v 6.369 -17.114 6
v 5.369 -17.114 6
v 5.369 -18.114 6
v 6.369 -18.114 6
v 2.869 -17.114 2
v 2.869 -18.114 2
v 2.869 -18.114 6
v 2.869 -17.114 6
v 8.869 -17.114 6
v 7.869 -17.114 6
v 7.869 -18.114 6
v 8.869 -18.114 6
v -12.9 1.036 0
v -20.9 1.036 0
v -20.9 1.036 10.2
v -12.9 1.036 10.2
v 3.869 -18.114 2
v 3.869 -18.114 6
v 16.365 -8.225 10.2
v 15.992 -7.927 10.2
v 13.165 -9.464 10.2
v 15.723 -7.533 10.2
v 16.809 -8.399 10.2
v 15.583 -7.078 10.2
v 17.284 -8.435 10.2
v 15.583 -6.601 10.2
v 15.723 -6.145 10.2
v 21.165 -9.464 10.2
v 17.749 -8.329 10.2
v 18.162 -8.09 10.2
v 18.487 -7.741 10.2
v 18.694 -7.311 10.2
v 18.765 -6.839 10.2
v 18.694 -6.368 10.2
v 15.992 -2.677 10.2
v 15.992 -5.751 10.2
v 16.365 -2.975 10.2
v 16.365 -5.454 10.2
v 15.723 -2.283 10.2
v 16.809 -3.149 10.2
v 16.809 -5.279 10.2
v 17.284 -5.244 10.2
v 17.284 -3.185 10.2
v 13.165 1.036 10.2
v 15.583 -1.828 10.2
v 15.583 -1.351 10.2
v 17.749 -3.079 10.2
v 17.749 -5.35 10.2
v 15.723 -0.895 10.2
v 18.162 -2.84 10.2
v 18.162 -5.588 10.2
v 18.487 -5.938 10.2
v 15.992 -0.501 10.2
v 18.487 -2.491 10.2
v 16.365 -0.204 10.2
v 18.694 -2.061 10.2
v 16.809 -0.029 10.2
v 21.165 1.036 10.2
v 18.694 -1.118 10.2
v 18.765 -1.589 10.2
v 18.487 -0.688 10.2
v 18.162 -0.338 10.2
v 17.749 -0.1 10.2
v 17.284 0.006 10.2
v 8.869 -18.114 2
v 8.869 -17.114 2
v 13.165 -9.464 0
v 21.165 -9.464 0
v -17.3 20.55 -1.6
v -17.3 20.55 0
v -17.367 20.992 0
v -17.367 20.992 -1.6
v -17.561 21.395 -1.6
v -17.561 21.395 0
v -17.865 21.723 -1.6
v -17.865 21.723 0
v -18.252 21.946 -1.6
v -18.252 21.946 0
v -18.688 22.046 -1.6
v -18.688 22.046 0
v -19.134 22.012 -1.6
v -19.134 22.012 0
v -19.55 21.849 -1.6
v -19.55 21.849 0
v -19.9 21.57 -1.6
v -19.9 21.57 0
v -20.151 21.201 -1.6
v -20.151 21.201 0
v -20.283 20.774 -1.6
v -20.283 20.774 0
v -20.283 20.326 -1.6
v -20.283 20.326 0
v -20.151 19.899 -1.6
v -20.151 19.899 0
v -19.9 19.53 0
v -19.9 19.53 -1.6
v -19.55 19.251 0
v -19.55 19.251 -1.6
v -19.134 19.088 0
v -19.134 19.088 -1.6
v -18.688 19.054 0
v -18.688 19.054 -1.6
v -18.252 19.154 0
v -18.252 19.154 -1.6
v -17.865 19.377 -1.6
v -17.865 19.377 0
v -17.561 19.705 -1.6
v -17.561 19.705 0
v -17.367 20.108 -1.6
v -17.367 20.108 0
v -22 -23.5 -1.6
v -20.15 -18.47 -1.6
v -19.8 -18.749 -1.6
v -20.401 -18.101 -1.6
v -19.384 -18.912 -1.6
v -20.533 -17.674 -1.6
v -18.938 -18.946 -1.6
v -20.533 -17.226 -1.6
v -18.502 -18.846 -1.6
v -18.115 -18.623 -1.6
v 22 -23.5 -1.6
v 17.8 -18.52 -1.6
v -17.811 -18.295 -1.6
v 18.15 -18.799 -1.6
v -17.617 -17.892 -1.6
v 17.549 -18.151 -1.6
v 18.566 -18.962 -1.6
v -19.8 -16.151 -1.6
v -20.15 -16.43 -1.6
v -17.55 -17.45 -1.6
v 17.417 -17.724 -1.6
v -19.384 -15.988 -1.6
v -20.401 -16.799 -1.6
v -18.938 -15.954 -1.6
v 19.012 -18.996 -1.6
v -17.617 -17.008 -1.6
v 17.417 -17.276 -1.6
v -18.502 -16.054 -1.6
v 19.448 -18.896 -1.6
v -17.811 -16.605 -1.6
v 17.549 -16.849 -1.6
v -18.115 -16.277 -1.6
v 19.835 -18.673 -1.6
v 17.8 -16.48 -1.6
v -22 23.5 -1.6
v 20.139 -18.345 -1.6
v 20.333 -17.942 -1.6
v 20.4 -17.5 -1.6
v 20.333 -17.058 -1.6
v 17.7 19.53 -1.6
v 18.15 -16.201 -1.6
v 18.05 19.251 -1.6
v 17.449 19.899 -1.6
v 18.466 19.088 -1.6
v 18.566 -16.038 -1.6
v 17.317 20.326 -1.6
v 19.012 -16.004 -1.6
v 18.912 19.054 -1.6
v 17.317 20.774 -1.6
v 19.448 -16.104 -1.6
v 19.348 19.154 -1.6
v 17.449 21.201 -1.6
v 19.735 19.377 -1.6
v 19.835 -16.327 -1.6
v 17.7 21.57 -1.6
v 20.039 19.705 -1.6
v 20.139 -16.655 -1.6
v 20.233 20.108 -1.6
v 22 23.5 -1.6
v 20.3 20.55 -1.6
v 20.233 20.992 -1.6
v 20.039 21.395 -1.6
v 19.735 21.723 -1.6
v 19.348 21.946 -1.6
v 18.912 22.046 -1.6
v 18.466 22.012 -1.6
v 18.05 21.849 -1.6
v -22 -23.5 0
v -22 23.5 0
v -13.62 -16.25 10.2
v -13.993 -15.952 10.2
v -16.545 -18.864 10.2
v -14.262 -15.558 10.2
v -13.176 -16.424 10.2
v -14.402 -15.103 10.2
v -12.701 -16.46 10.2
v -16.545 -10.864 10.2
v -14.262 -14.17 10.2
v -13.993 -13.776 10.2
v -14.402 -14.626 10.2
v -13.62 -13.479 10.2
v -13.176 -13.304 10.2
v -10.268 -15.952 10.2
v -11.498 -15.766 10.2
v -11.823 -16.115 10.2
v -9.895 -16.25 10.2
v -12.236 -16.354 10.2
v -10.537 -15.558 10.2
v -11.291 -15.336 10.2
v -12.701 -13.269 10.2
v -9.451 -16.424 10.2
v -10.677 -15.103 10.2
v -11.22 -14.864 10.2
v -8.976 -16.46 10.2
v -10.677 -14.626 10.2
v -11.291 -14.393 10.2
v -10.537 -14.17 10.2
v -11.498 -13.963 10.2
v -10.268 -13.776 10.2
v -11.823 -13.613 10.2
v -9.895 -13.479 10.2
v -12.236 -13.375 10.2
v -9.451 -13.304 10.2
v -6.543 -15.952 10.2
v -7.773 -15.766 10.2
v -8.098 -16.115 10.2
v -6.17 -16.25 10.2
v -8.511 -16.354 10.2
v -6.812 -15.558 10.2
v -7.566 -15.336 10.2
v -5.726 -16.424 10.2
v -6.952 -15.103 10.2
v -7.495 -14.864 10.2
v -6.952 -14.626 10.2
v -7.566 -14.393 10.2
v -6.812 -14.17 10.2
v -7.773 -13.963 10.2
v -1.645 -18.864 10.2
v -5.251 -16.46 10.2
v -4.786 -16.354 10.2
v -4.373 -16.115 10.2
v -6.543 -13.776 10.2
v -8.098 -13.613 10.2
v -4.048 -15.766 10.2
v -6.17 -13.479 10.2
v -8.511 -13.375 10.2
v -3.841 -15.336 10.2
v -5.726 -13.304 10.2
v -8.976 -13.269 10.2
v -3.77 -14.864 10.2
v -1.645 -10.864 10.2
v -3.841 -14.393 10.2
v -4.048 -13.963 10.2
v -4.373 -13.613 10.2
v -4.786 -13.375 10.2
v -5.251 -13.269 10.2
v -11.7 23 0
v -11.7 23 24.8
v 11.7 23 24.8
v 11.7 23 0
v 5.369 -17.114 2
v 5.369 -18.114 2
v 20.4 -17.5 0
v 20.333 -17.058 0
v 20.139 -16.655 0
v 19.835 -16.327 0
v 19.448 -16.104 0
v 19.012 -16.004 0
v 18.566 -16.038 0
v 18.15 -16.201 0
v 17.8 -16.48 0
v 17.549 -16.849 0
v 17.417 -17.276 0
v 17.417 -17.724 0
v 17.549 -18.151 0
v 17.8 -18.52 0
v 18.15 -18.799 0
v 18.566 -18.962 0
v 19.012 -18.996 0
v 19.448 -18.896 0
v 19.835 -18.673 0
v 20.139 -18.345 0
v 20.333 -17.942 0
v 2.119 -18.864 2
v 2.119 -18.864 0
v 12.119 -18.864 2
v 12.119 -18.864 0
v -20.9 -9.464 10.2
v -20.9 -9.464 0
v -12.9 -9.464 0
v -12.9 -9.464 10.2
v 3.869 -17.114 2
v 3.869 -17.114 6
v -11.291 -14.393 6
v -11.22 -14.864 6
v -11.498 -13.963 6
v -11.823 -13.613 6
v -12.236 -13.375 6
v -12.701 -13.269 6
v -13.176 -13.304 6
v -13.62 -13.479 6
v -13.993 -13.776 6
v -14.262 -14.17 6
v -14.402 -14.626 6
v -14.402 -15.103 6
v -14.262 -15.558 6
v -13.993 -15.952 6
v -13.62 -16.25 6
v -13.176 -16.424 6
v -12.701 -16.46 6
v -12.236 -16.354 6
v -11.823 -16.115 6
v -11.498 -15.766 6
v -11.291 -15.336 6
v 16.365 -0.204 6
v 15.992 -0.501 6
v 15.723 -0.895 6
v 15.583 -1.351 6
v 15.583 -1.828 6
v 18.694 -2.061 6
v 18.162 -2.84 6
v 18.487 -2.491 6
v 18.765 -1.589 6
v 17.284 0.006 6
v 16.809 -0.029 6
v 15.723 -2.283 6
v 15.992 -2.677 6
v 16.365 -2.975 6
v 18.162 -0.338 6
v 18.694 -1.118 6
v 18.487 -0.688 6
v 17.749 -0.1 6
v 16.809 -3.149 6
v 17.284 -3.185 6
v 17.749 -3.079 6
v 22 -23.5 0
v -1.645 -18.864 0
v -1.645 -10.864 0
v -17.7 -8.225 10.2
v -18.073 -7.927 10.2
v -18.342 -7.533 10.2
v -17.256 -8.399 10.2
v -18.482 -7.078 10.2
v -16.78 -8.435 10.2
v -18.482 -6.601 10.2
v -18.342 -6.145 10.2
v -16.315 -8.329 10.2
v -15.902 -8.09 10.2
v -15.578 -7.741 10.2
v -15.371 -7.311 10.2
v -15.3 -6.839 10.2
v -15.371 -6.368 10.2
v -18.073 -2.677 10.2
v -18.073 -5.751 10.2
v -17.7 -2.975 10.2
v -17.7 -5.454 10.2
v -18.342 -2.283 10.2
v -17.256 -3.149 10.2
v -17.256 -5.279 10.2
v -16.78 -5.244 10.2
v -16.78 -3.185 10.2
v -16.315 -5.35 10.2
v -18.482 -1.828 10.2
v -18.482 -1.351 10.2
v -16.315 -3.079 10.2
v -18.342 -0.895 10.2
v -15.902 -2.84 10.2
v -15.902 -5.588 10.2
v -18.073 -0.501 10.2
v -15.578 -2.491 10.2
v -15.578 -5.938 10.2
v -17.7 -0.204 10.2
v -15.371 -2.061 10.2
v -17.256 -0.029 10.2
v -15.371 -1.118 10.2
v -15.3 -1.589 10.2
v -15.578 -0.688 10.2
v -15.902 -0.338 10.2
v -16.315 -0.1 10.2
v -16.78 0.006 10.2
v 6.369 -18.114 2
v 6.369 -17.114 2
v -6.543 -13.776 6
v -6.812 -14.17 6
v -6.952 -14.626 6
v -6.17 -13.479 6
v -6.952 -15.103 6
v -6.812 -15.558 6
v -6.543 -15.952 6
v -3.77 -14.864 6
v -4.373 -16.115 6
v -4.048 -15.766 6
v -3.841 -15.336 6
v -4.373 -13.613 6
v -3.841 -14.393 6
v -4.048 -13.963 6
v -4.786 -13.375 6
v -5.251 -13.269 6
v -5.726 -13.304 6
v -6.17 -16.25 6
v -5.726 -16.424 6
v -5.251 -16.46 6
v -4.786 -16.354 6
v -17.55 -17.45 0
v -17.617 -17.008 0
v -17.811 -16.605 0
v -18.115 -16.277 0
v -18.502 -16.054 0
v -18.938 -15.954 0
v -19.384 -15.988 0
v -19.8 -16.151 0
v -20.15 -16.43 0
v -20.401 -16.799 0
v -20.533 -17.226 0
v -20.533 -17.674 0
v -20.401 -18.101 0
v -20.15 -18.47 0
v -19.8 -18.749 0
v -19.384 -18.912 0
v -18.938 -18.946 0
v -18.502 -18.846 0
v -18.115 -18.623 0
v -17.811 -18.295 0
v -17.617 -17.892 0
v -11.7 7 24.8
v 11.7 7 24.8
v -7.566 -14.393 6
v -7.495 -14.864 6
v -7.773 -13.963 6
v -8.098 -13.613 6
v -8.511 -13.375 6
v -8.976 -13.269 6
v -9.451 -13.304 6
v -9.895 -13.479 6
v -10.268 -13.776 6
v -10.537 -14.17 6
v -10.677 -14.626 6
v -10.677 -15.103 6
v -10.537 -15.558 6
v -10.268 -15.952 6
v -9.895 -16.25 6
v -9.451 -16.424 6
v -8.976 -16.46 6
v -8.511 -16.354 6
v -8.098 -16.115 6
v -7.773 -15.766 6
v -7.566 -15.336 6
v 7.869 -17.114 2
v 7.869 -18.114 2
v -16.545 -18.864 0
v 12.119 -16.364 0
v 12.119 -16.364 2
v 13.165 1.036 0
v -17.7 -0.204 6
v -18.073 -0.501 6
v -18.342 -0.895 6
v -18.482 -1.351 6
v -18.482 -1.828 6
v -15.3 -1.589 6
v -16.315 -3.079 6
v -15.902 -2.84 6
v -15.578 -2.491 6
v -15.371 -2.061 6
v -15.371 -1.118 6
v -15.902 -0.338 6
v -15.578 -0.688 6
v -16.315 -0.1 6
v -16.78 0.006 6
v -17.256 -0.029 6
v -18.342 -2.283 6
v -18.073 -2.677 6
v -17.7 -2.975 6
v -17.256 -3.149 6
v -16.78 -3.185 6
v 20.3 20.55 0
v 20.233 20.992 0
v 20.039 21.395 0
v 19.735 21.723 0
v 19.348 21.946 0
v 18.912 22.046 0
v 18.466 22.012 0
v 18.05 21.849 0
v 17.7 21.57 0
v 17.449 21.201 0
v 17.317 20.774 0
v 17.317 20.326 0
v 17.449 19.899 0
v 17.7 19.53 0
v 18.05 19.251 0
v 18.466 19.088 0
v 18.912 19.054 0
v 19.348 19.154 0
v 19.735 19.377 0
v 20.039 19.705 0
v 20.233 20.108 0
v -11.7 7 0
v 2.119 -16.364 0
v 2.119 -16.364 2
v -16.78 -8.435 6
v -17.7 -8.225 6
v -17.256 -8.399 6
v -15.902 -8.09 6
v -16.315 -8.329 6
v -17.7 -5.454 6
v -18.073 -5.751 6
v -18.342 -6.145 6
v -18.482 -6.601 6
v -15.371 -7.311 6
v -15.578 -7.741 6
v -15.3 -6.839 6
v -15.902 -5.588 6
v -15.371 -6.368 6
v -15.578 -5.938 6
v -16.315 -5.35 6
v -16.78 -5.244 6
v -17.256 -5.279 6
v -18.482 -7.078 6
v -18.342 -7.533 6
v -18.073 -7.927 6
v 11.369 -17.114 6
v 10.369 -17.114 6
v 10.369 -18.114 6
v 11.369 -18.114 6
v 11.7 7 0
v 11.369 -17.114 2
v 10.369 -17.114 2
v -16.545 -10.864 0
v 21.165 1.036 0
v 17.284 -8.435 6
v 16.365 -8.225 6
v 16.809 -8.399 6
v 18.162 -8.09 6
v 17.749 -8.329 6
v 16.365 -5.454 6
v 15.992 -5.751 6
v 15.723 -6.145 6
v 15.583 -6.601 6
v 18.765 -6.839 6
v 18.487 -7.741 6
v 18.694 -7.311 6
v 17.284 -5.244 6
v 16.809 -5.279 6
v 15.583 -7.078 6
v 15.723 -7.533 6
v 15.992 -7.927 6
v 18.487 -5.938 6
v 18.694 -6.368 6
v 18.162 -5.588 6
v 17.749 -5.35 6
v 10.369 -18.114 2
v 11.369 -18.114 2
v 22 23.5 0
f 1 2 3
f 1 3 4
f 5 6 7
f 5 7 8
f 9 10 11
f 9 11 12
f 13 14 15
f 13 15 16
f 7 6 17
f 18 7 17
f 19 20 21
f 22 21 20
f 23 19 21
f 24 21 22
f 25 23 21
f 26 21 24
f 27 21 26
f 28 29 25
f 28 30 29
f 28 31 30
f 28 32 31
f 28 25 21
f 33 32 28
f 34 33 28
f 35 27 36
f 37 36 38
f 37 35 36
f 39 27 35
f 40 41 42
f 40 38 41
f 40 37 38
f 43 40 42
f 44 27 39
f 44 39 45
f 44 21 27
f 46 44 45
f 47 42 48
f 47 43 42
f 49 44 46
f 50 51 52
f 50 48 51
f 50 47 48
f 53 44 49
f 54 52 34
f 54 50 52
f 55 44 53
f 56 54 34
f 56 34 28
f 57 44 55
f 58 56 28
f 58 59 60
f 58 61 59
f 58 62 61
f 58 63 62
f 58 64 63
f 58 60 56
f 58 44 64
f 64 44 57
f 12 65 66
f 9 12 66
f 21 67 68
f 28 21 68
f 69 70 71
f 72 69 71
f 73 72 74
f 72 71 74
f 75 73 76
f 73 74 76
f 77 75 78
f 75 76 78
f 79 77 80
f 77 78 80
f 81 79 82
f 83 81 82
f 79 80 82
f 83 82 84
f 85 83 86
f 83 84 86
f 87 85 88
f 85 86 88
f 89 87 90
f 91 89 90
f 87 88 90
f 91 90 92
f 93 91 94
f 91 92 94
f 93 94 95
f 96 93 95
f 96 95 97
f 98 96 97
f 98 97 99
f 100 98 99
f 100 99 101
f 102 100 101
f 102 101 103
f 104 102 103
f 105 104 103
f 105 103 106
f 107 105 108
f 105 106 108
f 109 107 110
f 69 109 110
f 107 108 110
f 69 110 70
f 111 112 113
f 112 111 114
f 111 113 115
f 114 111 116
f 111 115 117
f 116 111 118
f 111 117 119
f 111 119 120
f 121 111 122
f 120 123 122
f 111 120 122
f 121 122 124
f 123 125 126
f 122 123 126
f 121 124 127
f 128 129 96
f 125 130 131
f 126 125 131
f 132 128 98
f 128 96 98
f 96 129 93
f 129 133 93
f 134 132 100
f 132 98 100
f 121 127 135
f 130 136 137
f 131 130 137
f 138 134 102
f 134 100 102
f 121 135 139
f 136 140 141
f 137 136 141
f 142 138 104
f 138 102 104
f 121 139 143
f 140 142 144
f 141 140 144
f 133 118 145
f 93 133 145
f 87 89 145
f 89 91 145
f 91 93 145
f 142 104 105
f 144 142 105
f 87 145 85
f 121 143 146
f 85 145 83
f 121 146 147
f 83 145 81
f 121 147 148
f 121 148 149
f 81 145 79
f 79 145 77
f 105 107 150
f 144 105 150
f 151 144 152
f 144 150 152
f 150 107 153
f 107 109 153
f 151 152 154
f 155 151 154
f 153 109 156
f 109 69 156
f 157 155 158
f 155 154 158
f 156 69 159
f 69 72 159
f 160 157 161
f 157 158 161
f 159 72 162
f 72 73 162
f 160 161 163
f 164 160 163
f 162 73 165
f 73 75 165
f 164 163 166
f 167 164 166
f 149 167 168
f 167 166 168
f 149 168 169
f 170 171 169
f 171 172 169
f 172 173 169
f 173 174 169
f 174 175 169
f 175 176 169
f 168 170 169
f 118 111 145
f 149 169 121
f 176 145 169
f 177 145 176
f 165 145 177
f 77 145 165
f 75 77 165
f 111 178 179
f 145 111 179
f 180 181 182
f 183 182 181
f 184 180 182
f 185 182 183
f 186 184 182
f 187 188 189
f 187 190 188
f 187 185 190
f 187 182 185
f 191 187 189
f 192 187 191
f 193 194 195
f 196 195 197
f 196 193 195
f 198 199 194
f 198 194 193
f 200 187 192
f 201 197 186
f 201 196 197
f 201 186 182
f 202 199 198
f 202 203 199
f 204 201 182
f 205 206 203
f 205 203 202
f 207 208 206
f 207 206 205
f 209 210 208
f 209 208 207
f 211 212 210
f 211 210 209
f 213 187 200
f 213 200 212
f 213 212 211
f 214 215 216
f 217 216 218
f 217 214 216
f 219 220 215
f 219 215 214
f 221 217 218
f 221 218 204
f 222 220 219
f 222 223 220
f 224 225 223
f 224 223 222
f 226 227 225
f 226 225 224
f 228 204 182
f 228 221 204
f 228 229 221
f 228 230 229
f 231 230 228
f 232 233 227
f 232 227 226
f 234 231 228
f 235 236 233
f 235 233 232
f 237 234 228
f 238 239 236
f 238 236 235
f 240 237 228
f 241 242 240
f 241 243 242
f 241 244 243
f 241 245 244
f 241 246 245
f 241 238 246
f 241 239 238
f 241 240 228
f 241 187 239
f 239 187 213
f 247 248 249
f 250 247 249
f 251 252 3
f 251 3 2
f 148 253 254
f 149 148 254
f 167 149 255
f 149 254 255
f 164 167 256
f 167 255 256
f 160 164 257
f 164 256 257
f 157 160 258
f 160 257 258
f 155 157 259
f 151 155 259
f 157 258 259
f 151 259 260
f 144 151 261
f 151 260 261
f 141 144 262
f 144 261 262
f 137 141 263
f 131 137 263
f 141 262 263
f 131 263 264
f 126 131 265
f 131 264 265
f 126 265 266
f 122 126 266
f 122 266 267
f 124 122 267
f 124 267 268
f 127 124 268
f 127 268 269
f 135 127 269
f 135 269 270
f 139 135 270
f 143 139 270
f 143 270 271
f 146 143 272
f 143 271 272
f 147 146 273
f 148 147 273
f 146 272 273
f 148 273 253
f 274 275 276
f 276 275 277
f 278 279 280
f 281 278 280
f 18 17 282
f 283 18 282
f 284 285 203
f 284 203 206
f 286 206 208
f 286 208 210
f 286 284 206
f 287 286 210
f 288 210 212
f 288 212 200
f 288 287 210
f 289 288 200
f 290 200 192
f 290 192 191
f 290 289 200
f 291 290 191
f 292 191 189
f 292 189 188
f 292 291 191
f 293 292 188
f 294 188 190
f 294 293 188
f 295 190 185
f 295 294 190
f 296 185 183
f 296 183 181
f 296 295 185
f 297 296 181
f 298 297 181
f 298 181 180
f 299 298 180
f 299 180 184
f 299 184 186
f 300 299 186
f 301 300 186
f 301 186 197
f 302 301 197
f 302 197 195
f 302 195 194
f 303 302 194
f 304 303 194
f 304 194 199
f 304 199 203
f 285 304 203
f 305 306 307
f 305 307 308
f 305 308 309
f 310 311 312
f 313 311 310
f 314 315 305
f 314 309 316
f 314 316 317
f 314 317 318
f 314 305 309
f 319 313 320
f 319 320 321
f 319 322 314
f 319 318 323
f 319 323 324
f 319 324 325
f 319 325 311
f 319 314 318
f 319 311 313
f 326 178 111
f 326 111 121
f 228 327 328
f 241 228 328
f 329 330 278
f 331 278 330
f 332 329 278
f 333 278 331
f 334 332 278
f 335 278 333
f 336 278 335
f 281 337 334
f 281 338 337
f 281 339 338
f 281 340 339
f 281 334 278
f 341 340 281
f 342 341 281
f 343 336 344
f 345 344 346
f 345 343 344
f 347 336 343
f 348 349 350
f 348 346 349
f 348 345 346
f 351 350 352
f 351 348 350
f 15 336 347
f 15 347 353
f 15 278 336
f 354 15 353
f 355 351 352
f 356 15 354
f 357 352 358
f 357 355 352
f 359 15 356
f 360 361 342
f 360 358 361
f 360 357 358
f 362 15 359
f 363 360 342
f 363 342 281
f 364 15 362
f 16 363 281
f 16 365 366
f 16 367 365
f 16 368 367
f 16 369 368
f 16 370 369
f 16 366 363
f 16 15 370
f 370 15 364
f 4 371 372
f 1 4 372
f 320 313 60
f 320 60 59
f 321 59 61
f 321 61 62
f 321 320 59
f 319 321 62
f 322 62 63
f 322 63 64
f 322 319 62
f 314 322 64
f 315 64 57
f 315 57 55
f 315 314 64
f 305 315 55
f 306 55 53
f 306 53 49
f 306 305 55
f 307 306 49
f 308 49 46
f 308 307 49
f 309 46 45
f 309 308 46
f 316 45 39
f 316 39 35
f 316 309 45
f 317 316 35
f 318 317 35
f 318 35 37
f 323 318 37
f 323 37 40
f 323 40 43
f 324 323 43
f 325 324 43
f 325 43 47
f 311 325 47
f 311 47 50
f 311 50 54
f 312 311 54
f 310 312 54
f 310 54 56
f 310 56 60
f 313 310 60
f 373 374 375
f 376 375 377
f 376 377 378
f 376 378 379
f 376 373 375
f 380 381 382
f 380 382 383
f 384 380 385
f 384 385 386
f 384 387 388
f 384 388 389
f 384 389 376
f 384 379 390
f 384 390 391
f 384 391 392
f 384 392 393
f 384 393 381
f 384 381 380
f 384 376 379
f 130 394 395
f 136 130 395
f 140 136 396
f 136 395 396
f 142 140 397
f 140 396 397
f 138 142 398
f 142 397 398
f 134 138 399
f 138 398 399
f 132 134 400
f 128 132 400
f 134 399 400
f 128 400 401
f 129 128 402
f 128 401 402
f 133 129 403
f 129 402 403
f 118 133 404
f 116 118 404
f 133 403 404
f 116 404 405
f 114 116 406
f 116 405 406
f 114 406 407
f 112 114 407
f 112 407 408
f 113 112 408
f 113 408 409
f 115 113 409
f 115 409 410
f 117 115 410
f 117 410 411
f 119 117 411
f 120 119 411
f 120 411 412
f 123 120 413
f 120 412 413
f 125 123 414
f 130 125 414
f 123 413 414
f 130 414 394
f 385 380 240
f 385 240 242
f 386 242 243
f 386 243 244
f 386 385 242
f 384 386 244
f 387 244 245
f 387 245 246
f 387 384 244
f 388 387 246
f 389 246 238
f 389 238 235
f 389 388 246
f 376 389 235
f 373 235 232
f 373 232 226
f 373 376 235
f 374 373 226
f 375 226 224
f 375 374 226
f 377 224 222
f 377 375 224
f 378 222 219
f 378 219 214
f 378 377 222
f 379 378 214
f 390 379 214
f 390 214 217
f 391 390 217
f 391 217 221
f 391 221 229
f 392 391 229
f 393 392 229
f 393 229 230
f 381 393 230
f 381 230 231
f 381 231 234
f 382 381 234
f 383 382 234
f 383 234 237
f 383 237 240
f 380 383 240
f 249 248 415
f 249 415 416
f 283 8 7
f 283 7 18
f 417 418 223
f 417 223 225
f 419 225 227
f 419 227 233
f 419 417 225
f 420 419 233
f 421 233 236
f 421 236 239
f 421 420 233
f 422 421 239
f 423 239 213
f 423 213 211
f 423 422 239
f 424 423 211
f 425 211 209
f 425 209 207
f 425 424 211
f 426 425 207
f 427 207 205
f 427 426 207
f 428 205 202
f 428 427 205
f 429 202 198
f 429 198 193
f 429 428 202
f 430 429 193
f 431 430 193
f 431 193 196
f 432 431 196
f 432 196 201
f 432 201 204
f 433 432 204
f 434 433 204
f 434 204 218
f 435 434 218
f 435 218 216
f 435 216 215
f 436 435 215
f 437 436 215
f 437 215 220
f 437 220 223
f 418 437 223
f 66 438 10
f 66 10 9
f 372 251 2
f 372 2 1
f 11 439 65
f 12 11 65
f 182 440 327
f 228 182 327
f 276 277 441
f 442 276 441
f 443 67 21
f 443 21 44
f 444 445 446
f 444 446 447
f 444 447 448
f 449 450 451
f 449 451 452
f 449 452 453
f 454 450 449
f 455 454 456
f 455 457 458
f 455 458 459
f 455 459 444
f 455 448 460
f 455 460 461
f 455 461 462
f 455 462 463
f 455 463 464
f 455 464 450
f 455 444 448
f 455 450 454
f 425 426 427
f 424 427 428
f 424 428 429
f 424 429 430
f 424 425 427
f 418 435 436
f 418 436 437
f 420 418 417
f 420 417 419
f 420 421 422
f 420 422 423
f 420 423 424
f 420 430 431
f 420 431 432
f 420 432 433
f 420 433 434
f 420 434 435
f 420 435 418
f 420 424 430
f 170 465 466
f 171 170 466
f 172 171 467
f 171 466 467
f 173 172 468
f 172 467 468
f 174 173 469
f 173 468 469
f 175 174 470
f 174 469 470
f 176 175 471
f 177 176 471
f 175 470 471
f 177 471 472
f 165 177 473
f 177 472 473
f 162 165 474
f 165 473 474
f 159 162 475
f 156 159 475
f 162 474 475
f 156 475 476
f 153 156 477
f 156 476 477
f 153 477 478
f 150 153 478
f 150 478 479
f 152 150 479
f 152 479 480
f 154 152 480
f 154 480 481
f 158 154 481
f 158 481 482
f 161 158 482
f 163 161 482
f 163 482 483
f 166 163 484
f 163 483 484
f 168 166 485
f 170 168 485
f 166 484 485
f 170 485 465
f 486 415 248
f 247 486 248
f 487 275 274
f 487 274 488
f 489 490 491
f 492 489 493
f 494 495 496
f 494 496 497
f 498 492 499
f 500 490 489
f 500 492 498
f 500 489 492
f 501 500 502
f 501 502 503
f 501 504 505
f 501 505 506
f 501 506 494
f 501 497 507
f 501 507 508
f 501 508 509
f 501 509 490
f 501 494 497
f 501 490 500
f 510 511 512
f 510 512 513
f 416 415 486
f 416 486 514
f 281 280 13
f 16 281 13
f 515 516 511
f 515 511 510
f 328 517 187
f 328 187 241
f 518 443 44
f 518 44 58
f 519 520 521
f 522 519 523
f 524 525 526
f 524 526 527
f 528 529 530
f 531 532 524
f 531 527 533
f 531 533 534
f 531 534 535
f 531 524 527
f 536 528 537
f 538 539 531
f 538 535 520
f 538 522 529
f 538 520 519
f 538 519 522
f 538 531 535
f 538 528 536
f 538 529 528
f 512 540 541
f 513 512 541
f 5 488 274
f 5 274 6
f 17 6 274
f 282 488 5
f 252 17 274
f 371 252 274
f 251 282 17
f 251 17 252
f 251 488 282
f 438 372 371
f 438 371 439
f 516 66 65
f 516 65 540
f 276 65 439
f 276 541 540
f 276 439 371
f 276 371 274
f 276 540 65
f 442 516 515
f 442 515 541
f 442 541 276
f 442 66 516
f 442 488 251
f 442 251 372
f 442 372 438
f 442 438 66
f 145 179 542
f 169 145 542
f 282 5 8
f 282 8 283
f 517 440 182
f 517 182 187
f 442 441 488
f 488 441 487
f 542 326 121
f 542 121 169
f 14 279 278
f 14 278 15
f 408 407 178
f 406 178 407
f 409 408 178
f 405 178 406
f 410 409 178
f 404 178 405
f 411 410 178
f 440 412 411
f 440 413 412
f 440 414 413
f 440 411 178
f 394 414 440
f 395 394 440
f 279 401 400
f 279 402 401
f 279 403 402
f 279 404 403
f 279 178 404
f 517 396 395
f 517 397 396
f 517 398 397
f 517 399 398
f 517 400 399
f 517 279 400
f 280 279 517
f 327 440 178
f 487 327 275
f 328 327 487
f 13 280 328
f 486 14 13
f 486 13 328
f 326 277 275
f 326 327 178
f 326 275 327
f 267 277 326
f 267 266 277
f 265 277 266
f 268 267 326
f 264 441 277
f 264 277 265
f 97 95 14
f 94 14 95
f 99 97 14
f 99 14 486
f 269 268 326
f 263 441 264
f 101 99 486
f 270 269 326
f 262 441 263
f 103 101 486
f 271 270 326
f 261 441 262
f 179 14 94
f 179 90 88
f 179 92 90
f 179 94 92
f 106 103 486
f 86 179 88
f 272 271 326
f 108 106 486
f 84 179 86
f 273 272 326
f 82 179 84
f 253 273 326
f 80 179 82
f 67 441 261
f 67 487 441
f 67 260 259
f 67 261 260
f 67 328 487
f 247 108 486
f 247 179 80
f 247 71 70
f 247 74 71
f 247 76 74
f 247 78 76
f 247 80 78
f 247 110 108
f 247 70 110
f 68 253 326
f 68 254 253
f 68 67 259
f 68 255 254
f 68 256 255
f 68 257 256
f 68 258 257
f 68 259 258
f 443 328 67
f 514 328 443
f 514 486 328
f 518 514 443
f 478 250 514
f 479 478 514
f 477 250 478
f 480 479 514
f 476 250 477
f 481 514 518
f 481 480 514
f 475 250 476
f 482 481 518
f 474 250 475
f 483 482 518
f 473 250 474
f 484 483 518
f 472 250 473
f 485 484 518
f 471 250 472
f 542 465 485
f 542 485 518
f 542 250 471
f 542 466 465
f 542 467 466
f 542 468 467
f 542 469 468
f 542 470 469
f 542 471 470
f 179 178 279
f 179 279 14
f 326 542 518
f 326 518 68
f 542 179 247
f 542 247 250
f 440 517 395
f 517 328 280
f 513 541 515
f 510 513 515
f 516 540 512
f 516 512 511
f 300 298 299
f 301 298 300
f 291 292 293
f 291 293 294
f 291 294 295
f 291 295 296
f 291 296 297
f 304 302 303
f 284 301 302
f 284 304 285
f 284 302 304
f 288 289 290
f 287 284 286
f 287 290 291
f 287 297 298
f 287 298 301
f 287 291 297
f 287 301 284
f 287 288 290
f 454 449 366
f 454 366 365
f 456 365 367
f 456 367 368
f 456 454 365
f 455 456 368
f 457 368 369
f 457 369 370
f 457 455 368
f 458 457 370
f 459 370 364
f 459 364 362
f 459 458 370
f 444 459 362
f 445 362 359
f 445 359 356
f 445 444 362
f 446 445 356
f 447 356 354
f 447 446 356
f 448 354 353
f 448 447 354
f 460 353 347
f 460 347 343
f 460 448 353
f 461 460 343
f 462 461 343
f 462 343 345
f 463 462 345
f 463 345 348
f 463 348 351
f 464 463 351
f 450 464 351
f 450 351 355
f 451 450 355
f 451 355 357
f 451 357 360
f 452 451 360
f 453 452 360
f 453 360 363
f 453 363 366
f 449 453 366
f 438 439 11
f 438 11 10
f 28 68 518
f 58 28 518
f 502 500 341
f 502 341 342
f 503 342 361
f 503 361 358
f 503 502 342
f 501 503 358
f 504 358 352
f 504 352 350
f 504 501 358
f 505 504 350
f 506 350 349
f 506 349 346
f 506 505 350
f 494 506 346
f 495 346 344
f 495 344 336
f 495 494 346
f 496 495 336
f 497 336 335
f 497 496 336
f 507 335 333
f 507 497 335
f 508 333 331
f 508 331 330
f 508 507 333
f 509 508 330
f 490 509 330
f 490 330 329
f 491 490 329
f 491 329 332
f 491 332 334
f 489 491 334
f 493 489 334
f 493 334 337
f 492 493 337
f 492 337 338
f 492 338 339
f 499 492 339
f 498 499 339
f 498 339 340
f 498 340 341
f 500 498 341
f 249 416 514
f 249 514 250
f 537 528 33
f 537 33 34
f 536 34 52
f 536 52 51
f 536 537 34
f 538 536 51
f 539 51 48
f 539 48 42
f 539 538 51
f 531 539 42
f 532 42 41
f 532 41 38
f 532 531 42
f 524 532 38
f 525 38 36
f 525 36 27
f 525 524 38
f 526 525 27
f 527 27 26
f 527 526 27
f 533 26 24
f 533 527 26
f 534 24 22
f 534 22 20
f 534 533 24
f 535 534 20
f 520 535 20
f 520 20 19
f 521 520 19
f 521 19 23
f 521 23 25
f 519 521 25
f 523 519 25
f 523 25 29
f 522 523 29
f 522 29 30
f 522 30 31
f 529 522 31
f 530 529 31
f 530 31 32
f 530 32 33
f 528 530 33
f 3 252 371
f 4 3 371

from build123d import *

# Parameters (mm, degrees)
F0_W     = 44
F0_H     = 47
F0_R     = 1.5
F0_W_2   = 14.9
F0_H_2   = 8
F0_W_3   = 8
F0_H_3   = 10.5
F0_W_4   = 23.4
F0_H_4   = 16
F0_R_2   = 1.6
F0_W_5   = 2.5
F0_H_5   = 2.5
F0_W_6   = 1
F0_H_6   = 1
F1_DEPTH = 1.6
F2_DEPTH = 24.8
F3_DEPTH = 10.2
F4_DEPTH = 6
F5_DEPTH = 2
F6_DEPTH = 6


with BuildPart() as f1:
    # F0 (on Top) → F1 (new body)
    with BuildSketch(Plane.XY):
        Rectangle(F0_W, F0_H)
        with Locations((-19.05, -17.45)):
            Circle(F0_R, mode=Mode.SUBTRACT)
        with Locations((-9.0953609079, -14.8641939312)):
            Rectangle(F0_W_2, F0_H_2, mode=Mode.SUBTRACT)
        with Locations((-16.8999998868, -4.2141940668)):
            Rectangle(F0_W_3, F0_H_3, mode=Mode.SUBTRACT)
        Polygon((4.6191942506, -18.8641939312), (2.1191942506, -18.8641939312), (2.1191942506, -16.3641939312), (4.6191942506, -16.3641939312), (7.1191942506, -16.3641939312), (9.6191942506, -16.3641939312), (12.1191942506, -16.3641939312), (12.1191942506, -18.8641939312), (9.6191942506, -18.8641939312), (7.1191942506, -18.8641939312), align=None, mode=Mode.SUBTRACT)
        with Locations((18.9, -17.5)):
            Circle(F0_R, mode=Mode.SUBTRACT)
        with Locations((17.1648499519, -4.2141940668)):
            Rectangle(F0_W_3, F0_H_3, mode=Mode.SUBTRACT)
        with Locations((-18.8, 20.55)):
            Circle(F0_R, mode=Mode.SUBTRACT)
        with Locations((0, 15)):
            Rectangle(F0_W_4, F0_H_4, mode=Mode.SUBTRACT)
        with Locations((18.8, 20.55)):
            Circle(F0_R, mode=Mode.SUBTRACT)
        with Locations((0, 15)):
            Rectangle(F0_W_4, F0_H_4)
        with Locations((-9.0953609079, -14.8641939312)):
            Rectangle(F0_W_2, F0_H_2)
        with Locations((-12.8203609079, -14.8641939312)):
            Circle(F0_R_2, mode=Mode.SUBTRACT)
        with Locations((-9.0953609079, -14.8641939312)):
            Circle(F0_R_2, mode=Mode.SUBTRACT)
        with Locations((-5.3703609079, -14.8641939312)):
            Circle(F0_R_2, mode=Mode.SUBTRACT)
        with Locations((17.1648499519, -4.2141940668)):
            Rectangle(F0_W_3, F0_H_3)
        with Locations((17.1648499519, -6.8391940668)):
            Circle(F0_R_2, mode=Mode.SUBTRACT)
        with Locations((17.1648499519, -1.5891940668)):
            Circle(F0_R_2, mode=Mode.SUBTRACT)
        with Locations((-16.8999998868, -4.2141940668)):
            Rectangle(F0_W_3, F0_H_3)
        with Locations((-16.8999998868, -6.8391940668)):
            Circle(F0_R_2, mode=Mode.SUBTRACT)
        with Locations((-16.8999998868, -1.5891940668)):
            Circle(F0_R_2, mode=Mode.SUBTRACT)
        with Locations((-16.8999998868, -1.5891940668)):
            Circle(F0_R_2)
        with Locations((-16.8999998868, -6.8391940668)):
            Circle(F0_R_2)
        with Locations((-12.8203609079, -14.8641939312)):
            Circle(F0_R_2)
        with Locations((-9.0953609079, -14.8641939312)):
            Circle(F0_R_2)
        with Locations((-5.3703609079, -14.8641939312)):
            Circle(F0_R_2)
        with Locations((17.1648499519, -6.8391940668)):
            Circle(F0_R_2)
        with Locations((17.1648499519, -1.5891940668)):
            Circle(F0_R_2)
        with Locations((3.3691942506, -17.6141939312)):
            Rectangle(F0_W_5, F0_H_5)
        with Locations((3.3691942506, -17.6141939312)):
            Rectangle(F0_W_6, F0_H_6, mode=Mode.SUBTRACT)
        with Locations((5.8691942506, -17.6141939312)):
            Rectangle(F0_W_5, F0_H_5)
        with Locations((5.8691942506, -17.6141939312)):
            Rectangle(F0_W_6, F0_H_6, mode=Mode.SUBTRACT)
        with Locations((8.3691942506, -17.6141939312)):
            Rectangle(F0_W_5, F0_H_5)
        with Locations((8.3691942506, -17.6141939312)):
            Rectangle(F0_W_6, F0_H_6, mode=Mode.SUBTRACT)
        with Locations((10.8691942506, -17.6141939312)):
            Rectangle(F0_W_5, F0_H_5)
        with Locations((10.8691942506, -17.6141939312)):
            Rectangle(F0_W_6, F0_H_6, mode=Mode.SUBTRACT)
        with Locations((3.3691942506, -17.6141939312)):
            Rectangle(F0_W_6, F0_H_6)
        with Locations((5.8691942506, -17.6141939312)):
            Rectangle(F0_W_6, F0_H_6)
        with Locations((10.8691942506, -17.6141939312)):
            Rectangle(F0_W_6, F0_H_6)
        with Locations((8.3691942506, -17.6141939312)):
            Rectangle(F0_W_6, F0_H_6)
    extrude(amount=-F1_DEPTH)

    # F0 (on Top) → F2 (join)
    with BuildSketch(Plane.XY):
        with Locations((0, 15)):
            Rectangle(F0_W_4, F0_H_4)
    extrude(amount=F2_DEPTH)

    # F0 (on Top) → F3 (join)
    with BuildSketch(Plane.XY):
        with Locations((-16.8999998868, -4.2141940668)):
            Rectangle(F0_W_3, F0_H_3)
        with Locations((-16.8999998868, -6.8391940668)):
            Circle(F0_R_2, mode=Mode.SUBTRACT)
        with Locations((-16.8999998868, -1.5891940668)):
            Circle(F0_R_2, mode=Mode.SUBTRACT)
        with Locations((-9.0953609079, -14.8641939312)):
            Rectangle(F0_W_2, F0_H_2)
        with Locations((-12.8203609079, -14.8641939312)):
            Circle(F0_R_2, mode=Mode.SUBTRACT)
        with Locations((-9.0953609079, -14.8641939312)):
            Circle(F0_R_2, mode=Mode.SUBTRACT)
        with Locations((-5.3703609079, -14.8641939312)):
            Circle(F0_R_2, mode=Mode.SUBTRACT)
        with Locations((17.1648499519, -4.2141940668)):
            Rectangle(F0_W_3, F0_H_3)
        with Locations((17.1648499519, -6.8391940668)):
            Circle(F0_R_2, mode=Mode.SUBTRACT)
        with Locations((17.1648499519, -1.5891940668)):
            Circle(F0_R_2, mode=Mode.SUBTRACT)
    extrude(amount=F3_DEPTH)

    # F0 (on Top) → F4 (join)
    with BuildSketch(Plane.XY):
        with Locations((-16.8999998868, -1.5891940668)):
            Circle(F0_R_2)
        with Locations((-16.8999998868, -6.8391940668)):
            Circle(F0_R_2)
        with Locations((-12.8203609079, -14.8641939312)):
            Circle(F0_R_2)
        with Locations((-9.0953609079, -14.8641939312)):
            Circle(F0_R_2)
        with Locations((-5.3703609079, -14.8641939312)):
            Circle(F0_R_2)
        with Locations((17.1648499519, -6.8391940668)):
            Circle(F0_R_2)
        with Locations((17.1648499519, -1.5891940668)):
            Circle(F0_R_2)
    extrude(amount=F4_DEPTH)

    # F0 (on Top) → F5 (join)
    with BuildSketch(Plane.XY):
        with Locations((3.3691942506, -17.6141939312)):
            Rectangle(F0_W_5, F0_H_5)
        with Locations((3.3691942506, -17.6141939312)):
            Rectangle(F0_W_6, F0_H_6, mode=Mode.SUBTRACT)
        with Locations((5.8691942506, -17.6141939312)):
            Rectangle(F0_W_5, F0_H_5)
        with Locations((5.8691942506, -17.6141939312)):
            Rectangle(F0_W_6, F0_H_6, mode=Mode.SUBTRACT)
        with Locations((8.3691942506, -17.6141939312)):
            Rectangle(F0_W_5, F0_H_5)
        with Locations((8.3691942506, -17.6141939312)):
            Rectangle(F0_W_6, F0_H_6, mode=Mode.SUBTRACT)
        with Locations((10.8691942506, -17.6141939312)):
            Rectangle(F0_W_5, F0_H_5)
        with Locations((10.8691942506, -17.6141939312)):
            Rectangle(F0_W_6, F0_H_6, mode=Mode.SUBTRACT)
    extrude(amount=F5_DEPTH)

    # F0 (on Top) → F6 (join)
    with BuildSketch(Plane.XY):
        with Locations((3.3691942506, -17.6141939312)):
            Rectangle(F0_W_6, F0_H_6)
        with Locations((5.8691942506, -17.6141939312)):
            Rectangle(F0_W_6, F0_H_6)
        with Locations((8.3691942506, -17.6141939312)):
            Rectangle(F0_W_6, F0_H_6)
        with Locations((10.8691942506, -17.6141939312)):
            Rectangle(F0_W_6, F0_H_6)
    extrude(amount=F6_DEPTH)


solid = f1.part
